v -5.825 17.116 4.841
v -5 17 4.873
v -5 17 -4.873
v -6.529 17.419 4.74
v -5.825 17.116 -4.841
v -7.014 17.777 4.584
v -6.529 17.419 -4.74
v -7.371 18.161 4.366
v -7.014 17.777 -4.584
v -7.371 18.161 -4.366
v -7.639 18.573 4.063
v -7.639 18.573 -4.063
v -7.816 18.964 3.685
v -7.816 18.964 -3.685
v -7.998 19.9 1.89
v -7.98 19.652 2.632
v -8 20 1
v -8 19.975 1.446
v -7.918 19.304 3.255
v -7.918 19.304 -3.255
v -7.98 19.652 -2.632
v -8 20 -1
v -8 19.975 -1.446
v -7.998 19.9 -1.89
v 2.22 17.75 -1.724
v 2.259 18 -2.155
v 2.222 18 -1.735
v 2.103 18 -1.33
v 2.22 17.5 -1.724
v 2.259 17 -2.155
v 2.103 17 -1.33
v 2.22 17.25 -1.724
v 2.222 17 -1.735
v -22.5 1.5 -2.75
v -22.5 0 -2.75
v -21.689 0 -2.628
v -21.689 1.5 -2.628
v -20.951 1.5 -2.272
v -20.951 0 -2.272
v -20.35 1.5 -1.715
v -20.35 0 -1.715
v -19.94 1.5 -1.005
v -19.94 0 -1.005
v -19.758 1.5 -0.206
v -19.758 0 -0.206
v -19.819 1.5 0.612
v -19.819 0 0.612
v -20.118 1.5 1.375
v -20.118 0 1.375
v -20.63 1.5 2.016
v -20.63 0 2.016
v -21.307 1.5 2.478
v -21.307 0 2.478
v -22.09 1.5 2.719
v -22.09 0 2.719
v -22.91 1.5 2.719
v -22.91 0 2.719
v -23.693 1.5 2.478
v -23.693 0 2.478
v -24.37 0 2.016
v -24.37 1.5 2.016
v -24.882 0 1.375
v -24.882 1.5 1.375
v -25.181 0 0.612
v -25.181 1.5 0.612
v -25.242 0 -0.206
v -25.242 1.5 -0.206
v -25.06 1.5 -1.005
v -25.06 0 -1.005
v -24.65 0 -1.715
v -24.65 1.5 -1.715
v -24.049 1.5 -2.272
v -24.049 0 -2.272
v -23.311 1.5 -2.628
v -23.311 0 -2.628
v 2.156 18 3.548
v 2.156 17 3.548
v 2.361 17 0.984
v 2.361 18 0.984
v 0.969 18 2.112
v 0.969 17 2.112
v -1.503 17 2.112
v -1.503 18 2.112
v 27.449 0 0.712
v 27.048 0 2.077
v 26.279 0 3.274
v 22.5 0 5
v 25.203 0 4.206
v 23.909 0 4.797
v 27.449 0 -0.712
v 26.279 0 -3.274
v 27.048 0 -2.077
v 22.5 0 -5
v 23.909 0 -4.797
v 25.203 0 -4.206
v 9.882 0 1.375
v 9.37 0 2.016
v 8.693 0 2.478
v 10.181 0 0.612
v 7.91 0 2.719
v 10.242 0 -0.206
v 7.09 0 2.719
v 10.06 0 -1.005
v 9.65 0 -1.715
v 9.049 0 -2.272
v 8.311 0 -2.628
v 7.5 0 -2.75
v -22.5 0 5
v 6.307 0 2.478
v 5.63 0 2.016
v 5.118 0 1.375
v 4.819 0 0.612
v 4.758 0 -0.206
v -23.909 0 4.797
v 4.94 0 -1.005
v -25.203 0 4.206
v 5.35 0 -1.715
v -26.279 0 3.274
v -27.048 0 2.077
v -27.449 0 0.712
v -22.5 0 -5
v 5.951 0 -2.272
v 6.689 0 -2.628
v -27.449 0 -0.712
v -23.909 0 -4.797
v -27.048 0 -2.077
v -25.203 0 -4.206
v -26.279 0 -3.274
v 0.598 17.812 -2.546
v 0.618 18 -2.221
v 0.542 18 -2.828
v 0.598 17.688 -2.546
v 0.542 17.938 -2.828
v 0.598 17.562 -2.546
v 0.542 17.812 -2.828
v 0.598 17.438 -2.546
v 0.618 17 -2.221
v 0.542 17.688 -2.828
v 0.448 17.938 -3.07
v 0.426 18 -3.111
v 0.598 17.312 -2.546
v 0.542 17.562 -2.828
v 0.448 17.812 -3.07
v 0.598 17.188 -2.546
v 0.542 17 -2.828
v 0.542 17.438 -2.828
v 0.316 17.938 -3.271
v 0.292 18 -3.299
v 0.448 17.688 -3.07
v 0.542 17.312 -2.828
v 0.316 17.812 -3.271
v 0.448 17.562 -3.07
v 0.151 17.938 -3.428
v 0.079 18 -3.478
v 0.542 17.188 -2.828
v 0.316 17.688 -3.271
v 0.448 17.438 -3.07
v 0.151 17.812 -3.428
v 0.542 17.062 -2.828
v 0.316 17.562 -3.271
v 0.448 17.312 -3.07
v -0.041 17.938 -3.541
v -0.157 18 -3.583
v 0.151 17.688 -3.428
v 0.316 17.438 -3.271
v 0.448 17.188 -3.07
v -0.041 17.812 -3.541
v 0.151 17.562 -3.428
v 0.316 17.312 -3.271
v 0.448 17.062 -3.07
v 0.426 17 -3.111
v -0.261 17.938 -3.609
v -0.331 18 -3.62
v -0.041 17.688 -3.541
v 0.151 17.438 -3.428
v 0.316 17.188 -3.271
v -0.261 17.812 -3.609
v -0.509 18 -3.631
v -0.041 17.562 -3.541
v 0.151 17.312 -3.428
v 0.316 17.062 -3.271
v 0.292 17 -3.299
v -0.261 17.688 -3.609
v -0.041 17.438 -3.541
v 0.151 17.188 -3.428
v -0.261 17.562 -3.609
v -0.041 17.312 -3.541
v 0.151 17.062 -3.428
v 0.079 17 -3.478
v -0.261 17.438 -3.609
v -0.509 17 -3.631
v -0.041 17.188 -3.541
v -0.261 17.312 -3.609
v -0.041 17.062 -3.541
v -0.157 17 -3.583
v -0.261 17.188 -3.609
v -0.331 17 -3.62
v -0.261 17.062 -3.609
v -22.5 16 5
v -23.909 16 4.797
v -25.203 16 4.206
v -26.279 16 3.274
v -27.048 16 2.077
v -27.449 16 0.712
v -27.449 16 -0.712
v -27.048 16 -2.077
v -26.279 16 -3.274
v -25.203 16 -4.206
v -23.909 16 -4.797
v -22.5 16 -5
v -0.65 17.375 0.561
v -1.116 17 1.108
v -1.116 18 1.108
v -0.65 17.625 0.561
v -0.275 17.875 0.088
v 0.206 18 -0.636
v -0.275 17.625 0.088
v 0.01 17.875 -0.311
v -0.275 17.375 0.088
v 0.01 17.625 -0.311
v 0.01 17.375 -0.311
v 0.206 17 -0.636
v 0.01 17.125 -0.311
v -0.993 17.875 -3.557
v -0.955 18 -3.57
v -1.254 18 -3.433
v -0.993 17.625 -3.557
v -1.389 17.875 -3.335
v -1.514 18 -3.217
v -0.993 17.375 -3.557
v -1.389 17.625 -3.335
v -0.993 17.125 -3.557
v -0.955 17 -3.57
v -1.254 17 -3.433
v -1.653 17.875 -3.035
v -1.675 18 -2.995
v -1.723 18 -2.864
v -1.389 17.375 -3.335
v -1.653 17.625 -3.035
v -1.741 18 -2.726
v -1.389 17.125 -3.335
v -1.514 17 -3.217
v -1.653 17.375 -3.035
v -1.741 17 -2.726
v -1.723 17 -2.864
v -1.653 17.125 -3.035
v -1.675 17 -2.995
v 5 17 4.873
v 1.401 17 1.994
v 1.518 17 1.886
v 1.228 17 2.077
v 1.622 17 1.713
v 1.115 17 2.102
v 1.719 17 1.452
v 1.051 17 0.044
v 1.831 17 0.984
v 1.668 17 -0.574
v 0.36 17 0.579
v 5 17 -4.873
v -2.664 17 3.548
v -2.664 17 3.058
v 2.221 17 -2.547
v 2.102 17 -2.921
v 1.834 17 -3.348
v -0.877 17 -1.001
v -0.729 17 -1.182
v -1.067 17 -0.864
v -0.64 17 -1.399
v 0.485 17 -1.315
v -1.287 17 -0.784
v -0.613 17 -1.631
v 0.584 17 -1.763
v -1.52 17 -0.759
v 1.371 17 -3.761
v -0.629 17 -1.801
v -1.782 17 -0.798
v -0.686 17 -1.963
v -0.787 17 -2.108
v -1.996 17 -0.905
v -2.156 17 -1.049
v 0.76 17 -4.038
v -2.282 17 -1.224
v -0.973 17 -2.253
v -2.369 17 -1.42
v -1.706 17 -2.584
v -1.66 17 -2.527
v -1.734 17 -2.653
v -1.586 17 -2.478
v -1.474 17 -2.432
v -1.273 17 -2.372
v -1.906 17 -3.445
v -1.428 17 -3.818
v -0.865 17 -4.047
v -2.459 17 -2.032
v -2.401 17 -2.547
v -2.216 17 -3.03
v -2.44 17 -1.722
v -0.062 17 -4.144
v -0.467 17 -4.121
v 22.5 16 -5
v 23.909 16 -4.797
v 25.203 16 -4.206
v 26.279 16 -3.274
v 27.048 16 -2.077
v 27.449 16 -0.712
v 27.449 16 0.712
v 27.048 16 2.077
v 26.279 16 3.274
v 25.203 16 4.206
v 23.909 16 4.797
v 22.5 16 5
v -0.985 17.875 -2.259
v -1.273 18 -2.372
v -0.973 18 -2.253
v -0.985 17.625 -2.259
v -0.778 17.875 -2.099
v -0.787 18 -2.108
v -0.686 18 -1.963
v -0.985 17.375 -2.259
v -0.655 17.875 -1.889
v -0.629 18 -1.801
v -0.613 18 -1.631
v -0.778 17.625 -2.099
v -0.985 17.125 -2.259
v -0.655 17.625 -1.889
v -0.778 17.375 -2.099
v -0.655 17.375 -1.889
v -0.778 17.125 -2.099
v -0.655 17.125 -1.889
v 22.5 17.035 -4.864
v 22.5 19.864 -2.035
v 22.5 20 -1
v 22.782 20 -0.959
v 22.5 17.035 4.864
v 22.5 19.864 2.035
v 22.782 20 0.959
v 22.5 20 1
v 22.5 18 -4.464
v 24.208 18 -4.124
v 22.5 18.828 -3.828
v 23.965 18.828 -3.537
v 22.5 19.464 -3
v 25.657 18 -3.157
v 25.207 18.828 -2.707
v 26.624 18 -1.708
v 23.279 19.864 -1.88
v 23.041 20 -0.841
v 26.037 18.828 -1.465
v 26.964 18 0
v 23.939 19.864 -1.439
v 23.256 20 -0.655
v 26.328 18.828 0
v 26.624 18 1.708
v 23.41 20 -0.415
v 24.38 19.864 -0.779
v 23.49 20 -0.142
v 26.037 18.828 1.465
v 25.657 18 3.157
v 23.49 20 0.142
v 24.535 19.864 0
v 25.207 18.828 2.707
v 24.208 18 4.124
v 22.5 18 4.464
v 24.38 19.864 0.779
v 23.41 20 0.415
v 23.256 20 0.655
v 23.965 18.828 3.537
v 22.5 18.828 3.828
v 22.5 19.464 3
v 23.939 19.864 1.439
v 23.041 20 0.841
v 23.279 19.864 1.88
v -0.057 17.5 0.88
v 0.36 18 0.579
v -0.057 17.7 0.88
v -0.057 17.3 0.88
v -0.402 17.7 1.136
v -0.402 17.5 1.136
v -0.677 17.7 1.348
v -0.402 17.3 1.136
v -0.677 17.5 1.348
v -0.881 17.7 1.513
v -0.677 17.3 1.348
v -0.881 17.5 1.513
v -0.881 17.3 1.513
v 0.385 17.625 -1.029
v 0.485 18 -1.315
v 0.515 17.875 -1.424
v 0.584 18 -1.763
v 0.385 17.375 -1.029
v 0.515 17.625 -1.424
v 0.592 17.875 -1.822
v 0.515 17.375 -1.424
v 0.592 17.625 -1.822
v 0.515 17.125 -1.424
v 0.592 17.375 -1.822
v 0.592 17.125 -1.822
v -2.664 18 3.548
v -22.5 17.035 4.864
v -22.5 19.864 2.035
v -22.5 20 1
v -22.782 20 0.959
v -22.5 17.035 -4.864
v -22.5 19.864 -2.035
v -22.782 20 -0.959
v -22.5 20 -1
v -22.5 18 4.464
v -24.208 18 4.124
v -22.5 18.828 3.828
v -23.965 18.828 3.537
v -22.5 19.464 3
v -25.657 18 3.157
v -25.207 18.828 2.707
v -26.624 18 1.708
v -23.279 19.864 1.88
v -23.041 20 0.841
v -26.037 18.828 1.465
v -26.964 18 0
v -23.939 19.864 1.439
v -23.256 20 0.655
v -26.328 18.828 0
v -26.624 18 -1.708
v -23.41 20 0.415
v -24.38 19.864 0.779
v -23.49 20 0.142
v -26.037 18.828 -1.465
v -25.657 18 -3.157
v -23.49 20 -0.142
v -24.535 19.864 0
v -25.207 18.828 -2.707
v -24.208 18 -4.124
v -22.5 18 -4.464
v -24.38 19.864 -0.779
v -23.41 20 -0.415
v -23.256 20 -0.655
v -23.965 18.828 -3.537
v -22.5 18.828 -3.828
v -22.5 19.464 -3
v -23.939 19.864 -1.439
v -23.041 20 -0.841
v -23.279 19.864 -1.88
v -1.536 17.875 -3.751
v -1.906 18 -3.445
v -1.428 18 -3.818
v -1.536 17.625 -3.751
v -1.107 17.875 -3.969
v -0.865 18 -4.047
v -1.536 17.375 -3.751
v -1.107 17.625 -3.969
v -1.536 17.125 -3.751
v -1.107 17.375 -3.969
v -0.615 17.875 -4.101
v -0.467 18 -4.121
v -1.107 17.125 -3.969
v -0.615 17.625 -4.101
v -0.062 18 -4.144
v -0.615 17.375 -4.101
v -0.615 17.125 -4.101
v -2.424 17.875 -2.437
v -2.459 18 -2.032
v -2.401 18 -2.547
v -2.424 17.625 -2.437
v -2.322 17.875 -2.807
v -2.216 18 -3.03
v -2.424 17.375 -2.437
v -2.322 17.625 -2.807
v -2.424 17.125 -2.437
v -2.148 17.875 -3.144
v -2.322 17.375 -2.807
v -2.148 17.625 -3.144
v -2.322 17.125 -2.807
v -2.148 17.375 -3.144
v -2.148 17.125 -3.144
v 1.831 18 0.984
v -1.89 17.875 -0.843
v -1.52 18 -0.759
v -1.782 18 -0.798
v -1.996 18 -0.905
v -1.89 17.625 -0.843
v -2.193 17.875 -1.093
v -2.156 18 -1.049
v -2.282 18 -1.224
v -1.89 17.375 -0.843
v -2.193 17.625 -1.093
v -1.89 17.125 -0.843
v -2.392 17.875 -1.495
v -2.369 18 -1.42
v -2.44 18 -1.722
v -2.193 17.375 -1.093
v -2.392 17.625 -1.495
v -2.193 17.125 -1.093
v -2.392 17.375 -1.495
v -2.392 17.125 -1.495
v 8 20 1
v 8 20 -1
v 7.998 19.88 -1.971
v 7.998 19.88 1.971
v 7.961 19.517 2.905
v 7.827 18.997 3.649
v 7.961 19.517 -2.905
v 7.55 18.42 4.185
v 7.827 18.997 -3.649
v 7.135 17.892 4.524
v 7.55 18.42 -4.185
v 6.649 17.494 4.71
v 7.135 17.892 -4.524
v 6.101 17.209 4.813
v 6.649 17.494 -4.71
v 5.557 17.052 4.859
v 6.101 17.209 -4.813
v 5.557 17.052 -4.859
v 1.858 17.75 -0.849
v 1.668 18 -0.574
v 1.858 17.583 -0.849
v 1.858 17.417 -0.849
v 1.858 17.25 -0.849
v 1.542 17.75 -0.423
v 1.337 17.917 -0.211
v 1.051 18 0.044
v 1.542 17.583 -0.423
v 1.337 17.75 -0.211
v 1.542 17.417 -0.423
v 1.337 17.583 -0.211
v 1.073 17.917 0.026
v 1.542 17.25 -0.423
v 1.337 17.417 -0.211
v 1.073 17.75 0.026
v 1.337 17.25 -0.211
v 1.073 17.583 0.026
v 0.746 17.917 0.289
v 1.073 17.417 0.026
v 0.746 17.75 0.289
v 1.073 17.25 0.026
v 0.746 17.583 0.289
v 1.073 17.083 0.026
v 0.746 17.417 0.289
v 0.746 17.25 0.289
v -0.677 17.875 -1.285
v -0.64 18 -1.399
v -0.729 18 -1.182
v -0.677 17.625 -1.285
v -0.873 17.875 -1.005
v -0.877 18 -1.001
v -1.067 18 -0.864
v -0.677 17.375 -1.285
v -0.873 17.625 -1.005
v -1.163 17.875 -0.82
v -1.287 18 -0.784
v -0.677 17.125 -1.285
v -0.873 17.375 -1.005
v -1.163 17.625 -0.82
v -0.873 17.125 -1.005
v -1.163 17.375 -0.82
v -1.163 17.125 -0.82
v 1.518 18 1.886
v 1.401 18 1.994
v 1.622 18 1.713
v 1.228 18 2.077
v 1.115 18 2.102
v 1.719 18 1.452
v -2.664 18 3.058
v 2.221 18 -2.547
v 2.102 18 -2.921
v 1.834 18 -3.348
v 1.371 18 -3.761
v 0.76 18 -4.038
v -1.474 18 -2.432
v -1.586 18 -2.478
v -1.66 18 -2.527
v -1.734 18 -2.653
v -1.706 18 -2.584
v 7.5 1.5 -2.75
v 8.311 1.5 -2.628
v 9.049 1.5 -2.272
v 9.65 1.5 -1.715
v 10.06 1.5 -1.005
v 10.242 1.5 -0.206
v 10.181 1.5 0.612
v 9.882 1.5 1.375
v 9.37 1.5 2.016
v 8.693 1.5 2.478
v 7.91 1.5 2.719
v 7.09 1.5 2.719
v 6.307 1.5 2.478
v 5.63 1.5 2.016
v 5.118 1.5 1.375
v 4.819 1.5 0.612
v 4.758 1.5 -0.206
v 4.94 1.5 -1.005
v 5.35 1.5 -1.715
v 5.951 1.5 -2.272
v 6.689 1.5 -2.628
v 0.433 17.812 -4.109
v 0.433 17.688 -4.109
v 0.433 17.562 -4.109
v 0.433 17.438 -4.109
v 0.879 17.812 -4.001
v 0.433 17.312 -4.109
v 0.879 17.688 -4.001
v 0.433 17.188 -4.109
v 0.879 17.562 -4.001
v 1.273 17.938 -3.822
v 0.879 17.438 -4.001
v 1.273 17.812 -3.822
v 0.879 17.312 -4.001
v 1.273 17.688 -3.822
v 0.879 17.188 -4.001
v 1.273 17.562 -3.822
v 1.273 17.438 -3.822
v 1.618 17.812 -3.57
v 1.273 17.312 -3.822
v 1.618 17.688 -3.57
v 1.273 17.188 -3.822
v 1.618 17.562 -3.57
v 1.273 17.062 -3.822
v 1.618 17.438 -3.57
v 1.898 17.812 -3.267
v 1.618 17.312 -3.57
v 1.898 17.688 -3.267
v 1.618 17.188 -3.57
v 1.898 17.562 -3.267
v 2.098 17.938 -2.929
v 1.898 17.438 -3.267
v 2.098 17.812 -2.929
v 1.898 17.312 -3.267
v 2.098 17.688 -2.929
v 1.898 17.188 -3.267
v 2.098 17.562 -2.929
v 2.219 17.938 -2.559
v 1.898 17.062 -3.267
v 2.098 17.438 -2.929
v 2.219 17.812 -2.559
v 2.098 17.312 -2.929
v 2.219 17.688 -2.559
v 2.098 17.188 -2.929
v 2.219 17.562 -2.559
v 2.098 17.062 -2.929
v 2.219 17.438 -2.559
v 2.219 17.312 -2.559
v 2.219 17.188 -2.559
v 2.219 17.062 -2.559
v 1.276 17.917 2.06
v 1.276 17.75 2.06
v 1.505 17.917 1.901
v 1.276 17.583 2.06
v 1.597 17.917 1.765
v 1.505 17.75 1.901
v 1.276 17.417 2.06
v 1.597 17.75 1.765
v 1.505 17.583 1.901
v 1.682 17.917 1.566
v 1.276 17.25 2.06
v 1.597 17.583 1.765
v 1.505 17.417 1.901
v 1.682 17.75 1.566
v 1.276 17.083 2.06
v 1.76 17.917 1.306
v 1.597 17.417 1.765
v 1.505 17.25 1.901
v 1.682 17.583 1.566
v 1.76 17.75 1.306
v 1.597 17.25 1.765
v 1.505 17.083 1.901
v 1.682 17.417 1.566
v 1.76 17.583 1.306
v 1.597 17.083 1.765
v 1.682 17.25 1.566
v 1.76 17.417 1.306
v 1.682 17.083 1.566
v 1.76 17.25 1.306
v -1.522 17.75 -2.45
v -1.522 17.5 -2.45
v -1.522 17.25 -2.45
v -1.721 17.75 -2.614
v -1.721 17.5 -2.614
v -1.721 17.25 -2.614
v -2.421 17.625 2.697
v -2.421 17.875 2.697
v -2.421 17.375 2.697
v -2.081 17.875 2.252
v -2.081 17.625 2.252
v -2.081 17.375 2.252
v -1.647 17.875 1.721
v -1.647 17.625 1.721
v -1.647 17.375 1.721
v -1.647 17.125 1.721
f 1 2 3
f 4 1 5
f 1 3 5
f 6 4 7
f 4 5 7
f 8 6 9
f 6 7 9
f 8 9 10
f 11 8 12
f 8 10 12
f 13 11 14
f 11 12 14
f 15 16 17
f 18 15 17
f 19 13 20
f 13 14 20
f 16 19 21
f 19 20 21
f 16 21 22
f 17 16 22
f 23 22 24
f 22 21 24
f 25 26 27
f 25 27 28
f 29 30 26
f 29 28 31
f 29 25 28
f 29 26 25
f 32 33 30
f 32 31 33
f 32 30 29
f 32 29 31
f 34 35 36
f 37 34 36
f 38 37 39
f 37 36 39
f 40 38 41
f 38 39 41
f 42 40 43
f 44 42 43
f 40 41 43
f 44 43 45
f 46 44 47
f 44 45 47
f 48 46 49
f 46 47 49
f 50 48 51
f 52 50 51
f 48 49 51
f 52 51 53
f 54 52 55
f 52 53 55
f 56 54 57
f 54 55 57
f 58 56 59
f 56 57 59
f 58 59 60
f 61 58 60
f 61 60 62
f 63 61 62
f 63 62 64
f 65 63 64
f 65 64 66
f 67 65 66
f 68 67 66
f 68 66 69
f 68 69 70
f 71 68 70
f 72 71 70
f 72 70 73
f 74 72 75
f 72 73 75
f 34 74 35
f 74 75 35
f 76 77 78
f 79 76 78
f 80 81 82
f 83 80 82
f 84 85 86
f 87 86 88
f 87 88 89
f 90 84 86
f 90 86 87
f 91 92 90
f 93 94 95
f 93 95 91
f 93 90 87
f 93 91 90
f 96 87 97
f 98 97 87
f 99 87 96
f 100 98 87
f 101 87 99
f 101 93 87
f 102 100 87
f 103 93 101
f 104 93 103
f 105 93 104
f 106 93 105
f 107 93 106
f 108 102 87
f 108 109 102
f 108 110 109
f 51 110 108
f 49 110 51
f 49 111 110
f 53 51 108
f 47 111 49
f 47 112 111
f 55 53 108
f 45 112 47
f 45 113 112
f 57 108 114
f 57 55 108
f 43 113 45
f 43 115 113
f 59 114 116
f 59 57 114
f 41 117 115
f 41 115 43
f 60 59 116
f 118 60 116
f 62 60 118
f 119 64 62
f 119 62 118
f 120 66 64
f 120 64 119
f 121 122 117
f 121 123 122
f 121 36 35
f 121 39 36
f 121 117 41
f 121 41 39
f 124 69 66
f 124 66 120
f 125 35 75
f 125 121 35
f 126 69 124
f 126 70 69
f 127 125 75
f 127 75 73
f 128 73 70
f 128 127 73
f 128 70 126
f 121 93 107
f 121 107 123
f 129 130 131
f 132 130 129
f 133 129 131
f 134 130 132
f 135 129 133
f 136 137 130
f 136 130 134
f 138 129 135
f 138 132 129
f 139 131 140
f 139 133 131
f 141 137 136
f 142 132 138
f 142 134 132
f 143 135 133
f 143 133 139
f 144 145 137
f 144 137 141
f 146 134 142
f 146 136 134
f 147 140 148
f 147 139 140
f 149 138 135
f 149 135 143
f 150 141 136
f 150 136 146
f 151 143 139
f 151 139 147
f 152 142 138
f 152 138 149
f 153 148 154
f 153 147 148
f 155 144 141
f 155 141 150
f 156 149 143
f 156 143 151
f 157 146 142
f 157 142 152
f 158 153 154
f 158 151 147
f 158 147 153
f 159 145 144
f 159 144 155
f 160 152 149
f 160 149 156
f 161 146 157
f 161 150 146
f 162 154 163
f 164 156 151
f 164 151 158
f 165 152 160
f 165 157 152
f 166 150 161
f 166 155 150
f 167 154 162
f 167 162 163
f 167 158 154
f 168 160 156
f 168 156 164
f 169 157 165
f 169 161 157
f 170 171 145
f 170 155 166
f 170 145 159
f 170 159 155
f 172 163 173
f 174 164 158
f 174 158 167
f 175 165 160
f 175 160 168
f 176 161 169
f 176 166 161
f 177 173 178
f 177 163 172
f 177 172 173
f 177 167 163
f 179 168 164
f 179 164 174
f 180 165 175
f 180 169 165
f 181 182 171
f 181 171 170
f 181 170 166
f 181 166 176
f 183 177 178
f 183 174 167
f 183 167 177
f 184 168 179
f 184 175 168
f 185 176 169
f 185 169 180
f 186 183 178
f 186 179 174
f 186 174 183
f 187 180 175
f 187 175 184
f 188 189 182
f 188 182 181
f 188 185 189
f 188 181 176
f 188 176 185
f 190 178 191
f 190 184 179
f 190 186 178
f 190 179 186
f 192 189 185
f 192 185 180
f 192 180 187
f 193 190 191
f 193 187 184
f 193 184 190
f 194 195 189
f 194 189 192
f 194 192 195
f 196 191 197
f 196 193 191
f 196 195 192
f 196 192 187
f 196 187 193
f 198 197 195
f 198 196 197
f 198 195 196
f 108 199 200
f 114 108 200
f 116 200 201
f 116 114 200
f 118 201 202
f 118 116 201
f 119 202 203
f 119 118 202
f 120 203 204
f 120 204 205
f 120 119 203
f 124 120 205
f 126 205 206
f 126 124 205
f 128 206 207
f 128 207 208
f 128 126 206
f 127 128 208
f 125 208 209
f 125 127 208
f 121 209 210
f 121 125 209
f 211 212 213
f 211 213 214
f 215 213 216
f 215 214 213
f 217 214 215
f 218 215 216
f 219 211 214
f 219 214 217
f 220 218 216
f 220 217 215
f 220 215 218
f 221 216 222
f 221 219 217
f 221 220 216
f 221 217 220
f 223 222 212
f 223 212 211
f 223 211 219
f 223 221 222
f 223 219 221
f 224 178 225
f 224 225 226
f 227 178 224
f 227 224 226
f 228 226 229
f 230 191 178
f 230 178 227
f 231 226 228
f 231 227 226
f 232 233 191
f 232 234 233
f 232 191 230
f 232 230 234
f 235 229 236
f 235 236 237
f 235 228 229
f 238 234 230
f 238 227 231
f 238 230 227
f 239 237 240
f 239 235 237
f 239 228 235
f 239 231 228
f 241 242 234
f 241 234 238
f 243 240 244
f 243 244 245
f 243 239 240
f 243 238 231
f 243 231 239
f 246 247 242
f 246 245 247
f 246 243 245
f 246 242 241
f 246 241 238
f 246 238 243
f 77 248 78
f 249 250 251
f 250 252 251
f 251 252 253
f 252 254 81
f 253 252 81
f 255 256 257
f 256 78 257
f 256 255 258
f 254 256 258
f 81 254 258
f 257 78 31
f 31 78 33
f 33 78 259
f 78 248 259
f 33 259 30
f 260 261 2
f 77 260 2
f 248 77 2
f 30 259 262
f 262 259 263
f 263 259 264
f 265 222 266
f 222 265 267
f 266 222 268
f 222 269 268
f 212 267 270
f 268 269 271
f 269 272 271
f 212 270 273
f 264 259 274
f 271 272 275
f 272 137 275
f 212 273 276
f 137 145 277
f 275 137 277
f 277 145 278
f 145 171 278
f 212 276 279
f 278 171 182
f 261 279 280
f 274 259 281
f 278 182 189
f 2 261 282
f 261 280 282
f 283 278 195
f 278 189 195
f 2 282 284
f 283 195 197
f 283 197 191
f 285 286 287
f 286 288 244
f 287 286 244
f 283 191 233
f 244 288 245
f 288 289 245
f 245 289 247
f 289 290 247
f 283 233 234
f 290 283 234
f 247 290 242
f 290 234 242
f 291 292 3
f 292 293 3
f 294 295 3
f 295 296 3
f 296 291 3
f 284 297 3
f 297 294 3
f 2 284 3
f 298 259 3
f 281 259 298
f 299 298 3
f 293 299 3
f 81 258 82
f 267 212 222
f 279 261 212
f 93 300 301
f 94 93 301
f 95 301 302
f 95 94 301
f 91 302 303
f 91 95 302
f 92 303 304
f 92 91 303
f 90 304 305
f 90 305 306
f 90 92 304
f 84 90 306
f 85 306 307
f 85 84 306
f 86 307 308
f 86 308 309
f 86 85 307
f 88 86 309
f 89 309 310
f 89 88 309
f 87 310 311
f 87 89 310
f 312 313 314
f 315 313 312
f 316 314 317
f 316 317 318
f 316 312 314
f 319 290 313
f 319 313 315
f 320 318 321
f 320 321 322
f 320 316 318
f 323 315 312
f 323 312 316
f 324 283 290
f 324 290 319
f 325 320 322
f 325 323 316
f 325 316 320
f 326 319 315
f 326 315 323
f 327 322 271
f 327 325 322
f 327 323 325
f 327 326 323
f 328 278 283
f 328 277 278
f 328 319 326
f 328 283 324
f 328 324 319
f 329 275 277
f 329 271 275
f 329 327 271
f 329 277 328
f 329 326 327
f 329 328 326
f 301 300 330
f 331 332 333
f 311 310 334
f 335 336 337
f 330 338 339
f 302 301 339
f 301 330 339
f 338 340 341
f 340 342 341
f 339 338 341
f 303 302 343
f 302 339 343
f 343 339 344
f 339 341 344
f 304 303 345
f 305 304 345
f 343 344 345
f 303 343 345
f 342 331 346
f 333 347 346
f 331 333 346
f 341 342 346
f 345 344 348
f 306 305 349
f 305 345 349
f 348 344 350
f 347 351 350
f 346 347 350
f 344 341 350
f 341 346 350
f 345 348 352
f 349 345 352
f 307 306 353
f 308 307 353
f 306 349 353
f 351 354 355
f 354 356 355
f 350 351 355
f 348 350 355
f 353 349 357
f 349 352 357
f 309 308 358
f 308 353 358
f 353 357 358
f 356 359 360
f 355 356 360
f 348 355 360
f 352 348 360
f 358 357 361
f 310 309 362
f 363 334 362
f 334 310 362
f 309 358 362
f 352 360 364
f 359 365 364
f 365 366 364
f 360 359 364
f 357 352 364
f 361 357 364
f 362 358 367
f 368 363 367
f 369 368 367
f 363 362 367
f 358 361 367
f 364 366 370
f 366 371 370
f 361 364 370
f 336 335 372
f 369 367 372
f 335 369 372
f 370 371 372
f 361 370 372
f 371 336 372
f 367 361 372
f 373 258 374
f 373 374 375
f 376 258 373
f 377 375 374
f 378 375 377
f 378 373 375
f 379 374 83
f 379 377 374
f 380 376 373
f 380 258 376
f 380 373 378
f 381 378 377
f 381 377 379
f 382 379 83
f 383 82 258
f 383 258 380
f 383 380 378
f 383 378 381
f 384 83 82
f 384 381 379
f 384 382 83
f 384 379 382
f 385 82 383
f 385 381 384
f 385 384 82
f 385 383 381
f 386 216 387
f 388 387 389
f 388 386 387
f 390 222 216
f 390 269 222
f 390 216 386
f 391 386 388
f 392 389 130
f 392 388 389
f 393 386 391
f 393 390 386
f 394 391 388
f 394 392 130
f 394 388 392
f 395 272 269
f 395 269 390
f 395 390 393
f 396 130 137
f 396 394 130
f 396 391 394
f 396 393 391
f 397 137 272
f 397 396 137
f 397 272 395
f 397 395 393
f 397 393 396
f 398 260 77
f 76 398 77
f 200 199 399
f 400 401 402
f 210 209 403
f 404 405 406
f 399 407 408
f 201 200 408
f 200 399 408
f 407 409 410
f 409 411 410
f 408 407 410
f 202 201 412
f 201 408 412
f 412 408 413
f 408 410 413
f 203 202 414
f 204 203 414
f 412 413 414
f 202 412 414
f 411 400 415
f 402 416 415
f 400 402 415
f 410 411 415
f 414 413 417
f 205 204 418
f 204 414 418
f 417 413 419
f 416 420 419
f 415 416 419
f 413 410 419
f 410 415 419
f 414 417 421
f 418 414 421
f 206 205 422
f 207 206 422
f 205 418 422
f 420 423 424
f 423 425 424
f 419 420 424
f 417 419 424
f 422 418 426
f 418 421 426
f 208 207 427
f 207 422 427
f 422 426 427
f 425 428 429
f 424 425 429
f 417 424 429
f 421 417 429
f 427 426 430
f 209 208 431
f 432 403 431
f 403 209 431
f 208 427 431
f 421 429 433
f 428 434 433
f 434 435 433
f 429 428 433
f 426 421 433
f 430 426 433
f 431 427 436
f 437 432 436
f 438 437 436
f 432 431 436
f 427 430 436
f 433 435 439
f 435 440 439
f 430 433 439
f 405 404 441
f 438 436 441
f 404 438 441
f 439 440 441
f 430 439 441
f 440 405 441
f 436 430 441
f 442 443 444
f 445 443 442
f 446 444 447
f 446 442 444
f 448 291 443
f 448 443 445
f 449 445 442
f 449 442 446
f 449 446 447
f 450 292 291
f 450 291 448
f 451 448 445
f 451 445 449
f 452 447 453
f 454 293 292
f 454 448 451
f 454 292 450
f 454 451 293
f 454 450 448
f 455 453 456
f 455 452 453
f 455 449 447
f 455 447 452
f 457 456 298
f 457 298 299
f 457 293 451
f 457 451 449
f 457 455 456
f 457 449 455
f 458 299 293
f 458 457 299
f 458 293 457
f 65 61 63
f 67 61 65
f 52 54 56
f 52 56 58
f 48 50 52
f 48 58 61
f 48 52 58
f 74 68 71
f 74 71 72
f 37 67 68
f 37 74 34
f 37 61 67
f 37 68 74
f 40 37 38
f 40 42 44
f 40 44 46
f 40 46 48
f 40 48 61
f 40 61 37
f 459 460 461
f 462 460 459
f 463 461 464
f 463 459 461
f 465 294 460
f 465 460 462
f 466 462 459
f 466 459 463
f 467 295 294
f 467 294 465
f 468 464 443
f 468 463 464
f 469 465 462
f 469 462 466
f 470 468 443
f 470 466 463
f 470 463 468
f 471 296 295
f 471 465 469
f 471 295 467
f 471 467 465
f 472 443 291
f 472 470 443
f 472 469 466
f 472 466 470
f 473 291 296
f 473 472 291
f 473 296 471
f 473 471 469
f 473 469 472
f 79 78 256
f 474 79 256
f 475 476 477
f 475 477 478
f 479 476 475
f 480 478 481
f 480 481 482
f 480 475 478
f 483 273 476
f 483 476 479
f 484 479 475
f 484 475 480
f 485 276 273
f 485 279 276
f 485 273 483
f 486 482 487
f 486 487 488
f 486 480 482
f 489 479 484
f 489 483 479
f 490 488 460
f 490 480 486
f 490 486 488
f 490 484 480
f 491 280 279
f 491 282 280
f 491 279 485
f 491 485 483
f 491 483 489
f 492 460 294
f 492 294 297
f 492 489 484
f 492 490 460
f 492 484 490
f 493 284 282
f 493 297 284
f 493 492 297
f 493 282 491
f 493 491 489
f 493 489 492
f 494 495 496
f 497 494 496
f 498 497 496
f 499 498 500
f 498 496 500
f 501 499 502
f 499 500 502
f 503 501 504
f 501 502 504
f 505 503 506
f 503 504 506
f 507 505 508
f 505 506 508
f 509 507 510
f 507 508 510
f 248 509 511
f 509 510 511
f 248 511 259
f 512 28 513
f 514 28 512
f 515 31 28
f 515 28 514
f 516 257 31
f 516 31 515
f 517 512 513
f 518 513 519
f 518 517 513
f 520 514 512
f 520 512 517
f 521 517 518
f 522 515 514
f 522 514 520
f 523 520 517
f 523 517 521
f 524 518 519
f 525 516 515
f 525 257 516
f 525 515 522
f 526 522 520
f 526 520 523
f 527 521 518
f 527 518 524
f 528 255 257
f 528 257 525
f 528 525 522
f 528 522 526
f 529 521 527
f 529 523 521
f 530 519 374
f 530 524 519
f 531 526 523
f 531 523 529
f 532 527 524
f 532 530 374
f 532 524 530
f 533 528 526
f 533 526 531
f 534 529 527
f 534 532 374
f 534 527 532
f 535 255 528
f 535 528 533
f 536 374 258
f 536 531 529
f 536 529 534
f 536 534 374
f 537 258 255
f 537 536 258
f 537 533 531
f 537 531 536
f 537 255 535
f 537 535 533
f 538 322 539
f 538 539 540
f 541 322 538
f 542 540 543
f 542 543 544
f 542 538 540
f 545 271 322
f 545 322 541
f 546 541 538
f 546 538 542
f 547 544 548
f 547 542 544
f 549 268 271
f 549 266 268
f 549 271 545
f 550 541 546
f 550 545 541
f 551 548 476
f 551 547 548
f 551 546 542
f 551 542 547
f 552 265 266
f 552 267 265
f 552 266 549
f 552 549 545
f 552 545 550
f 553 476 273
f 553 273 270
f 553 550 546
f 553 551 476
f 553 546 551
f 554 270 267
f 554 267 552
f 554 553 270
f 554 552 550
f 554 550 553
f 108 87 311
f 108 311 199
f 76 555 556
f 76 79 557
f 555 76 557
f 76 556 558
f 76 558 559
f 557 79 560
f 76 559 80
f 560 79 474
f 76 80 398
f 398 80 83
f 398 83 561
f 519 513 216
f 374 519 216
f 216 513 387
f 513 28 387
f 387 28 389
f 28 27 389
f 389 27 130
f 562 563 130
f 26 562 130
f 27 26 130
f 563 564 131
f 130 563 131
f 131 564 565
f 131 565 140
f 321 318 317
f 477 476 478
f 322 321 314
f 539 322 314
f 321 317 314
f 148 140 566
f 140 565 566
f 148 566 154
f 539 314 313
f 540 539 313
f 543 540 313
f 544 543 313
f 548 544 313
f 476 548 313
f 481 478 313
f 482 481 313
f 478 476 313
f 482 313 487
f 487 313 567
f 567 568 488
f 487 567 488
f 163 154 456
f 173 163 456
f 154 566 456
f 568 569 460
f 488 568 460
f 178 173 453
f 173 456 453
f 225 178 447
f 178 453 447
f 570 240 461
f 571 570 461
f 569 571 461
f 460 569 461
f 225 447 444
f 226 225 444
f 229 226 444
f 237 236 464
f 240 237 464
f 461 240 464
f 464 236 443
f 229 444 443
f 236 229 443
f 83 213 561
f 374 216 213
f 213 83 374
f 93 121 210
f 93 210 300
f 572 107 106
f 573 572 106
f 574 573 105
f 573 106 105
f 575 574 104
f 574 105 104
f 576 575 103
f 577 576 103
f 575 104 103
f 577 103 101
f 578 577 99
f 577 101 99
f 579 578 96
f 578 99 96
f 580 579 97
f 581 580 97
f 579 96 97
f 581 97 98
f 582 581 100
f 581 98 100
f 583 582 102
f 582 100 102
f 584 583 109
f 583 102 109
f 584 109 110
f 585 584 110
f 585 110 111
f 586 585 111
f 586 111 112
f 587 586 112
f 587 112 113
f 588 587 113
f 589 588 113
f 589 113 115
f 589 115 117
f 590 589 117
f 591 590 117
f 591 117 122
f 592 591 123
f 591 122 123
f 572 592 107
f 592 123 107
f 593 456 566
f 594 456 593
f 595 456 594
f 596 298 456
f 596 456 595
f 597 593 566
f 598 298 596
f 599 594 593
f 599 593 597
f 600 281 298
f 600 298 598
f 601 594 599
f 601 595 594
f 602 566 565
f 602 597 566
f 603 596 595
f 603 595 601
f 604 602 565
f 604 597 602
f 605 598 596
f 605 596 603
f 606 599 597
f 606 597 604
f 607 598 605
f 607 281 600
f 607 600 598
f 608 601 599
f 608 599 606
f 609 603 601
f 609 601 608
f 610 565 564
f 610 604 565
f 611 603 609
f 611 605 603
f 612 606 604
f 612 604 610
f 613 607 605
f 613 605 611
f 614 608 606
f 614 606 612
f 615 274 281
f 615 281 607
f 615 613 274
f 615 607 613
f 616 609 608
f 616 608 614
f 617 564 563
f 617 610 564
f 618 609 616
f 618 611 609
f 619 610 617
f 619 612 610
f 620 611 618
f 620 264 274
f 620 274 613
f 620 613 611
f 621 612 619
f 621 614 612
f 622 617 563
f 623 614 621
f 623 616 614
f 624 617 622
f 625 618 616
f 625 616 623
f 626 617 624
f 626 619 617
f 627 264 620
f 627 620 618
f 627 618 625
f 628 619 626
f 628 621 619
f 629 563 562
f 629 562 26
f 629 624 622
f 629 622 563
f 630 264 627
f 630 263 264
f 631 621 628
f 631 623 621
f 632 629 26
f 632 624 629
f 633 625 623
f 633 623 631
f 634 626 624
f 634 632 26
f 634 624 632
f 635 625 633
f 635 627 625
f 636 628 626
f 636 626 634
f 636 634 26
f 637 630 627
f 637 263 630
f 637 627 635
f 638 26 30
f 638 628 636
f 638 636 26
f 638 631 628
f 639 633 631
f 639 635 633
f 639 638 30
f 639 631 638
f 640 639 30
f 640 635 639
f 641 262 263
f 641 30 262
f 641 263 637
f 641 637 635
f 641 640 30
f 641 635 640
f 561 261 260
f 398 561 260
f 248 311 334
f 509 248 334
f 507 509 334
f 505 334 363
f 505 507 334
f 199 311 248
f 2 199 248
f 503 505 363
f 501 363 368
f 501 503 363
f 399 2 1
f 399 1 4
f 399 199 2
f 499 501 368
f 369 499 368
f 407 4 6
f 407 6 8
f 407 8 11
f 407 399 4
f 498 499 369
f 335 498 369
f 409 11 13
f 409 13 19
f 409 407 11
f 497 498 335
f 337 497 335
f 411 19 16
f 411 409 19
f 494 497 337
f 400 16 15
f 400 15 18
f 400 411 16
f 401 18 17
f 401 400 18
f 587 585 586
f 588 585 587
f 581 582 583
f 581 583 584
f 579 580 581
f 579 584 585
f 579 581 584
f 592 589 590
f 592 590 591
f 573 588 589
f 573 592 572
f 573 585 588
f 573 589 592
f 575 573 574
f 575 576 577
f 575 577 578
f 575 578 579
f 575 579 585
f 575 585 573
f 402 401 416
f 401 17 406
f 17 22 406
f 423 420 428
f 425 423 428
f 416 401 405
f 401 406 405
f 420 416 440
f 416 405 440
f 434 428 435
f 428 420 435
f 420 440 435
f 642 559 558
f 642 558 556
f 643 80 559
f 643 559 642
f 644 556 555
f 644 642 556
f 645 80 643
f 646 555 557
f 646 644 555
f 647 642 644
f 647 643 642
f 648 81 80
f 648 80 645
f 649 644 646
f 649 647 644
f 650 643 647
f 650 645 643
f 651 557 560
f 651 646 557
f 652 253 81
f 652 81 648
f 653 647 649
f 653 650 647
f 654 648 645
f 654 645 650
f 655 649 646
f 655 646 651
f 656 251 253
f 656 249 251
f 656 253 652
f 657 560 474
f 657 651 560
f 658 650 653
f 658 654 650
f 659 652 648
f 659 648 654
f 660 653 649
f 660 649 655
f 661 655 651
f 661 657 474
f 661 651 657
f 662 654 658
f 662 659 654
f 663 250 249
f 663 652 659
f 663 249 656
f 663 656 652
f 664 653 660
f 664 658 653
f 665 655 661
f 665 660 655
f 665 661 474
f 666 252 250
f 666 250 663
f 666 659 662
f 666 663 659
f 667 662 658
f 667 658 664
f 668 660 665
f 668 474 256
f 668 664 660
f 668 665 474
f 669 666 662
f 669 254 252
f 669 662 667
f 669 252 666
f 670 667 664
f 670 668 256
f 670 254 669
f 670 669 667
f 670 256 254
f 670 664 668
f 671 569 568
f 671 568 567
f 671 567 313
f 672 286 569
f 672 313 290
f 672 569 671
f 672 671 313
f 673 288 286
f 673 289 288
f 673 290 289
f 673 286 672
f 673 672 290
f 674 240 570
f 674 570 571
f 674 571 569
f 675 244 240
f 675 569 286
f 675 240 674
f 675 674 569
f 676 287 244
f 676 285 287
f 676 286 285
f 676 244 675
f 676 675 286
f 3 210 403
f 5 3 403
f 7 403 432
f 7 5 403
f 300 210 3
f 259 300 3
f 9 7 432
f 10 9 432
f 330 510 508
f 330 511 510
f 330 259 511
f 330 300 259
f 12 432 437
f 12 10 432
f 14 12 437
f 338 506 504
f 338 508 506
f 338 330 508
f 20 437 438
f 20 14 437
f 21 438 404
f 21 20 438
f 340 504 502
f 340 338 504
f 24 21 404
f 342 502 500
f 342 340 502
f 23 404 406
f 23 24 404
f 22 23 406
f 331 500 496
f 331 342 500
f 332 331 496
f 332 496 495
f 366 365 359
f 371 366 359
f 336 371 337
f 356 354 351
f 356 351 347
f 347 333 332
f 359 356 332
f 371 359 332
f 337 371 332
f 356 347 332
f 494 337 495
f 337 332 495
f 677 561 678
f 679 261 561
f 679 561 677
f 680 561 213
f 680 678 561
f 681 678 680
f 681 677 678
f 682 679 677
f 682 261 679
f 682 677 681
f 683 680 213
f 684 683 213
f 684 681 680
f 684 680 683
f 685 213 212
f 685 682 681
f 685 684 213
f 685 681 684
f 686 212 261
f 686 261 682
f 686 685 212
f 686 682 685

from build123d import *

# Parameters (mm, degrees)
BOSS_EXTRUDE1_DEPTH     = 20
FILLET1_R               = 4
SKETCH2_R               = 2.75
CUT_EXTRUDE1_DEPTH      = 1.5
LPATTERN1_COUNT         = 2
LPATTERN1_PITCH         = 30
CUT_EXTRUDE2_DEPTH      = 35.369317712
CUT_EXTRUDE2_DEPTH_BACK = 35.369317712
WRAP1_DEPTH             = 1


# Read off the part's stored shape, not the designer's step: Wrap1
with BuildPart() as part:
    # Sketch1 → Boss-Extrude1 (new body)
    with BuildSketch(Plane(origin=(0, 0, 0), x_dir=(1, 0, 0), z_dir=(0, 1, 0))):
        with BuildLine():
            Line((22.5, -5), (-22.5, -5))
            ThreePointArc((-22.5, -5), (-27.5, 0), (-22.5, 5))
            Line((-22.5, 5), (22.5, 5))
            ThreePointArc((22.5, 5), (27.5, 0), (22.5, -5))
        make_face()
    extrude(amount=BOSS_EXTRUDE1_DEPTH)

    # Fillet1
    fillet1_edges = [part.edges().sort_by_distance(p)[0] for p in [
        (-27.5, 20, 0),
        (0, 20, 5),
        (27.5, 20, 0),
        (0, 20, -5),
    ]]
    fillet(fillet1_edges, radius=FILLET1_R)

    # Sketch2 → Cut-Extrude1 (cut)
    with BuildSketch(Plane.XZ):
        with Locations(Location((-22.5, 0, 0), (0, 0, 270))):
            Circle(SKETCH2_R)
    cut_extrude1 = extrude(amount=-CUT_EXTRUDE1_DEPTH, mode=Mode.SUBTRACT)

    # LPattern1: Cut-Extrude1 ×2
    with Locations(*[(i * LPATTERN1_PITCH, 0, 0) for i in range(1, LPATTERN1_COUNT)]):
        add(cut_extrude1, mode=Mode.SUBTRACT)

    # Sketch3 → Cut-Extrude2 (cut, two sides: drawn at the far end of the back side and taken through both)
    with BuildSketch(Plane.XY.offset(-CUT_EXTRUDE2_DEPTH_BACK)):
        with BuildLine():
            Line((-5, 23), (5, 23))
            ThreePointArc((5, 23), (8, 20), (5, 17))
            Line((5, 17), (-5, 17))
            ThreePointArc((-5, 17), (-8, 20), (-5, 23))
        make_face()
    extrude(amount=CUT_EXTRUDE2_DEPTH + CUT_EXTRUDE2_DEPTH_BACK, mode=Mode.SUBTRACT)

    # Wrap1 outline → Wrap1 (add)
    with BuildSketch(Plane(origin=(0, 17, 0), x_dir=(1, 0, 0), z_dir=(0, 1, 0))):
        with BuildLine():
            add(Edge.make_bspline(
                [(0.968558604, -2.112404227), (1.023340463, -2.110381468), (1.128135866, -2.106512015), (1.275421614, -2.065066433), (1.40411806, -1.999153831), (1.494113345, -1.918796765), (1.555259283, -1.8377784), (1.600182088, -1.761379971), (1.643056037, -1.669468115), (1.68410688, -1.562162987), (1.724115658, -1.439672484), (1.762787282, -1.301883834), (1.796828359, -1.147944523), (1.819117415, -1.040313742), (1.830738091, -0.984199098)],
                knots=[0, 0, 0, 0, 0.10403341, 0.199011557, 0.288612319, 0.377191825, 0.425797175, 0.481425289, 0.545557079, 0.61863331, 0.699984683, 0.790771883, 0.890916323, 1, 1, 1, 1], degree=3))
            Line((0.968558604, -2.112404227), (-1.502595242, -2.112404227))
            add(Edge.make_bspline(
                [(0.359584245, -0.57875038), (0.287589412, -0.631266446), (0.149119993, -0.732271876), (-0.052040125, -0.874957595), (-0.232151558, -1.010570949), (-0.396984875, -1.13231455), (-0.543079134, -1.243803459), (-0.672030163, -1.343433338), (-0.782764208, -1.43141572), (-0.961872458, -1.579798827), (-1.207220157, -1.798528227), (-1.40469562, -2.00837263), (-1.502595242, -2.112404227)],
                knots=[0, 0, 0, 0, 0.110593572, 0.212707314, 0.306051588, 0.390379305, 0.467018215, 0.534117187, 0.592614819, 0.642525788, 0.822780058, 1, 1, 1, 1], degree=3))
            add(Edge.make_bspline(
                [(2.103173989, 1.329903466), (2.066781163, 1.246346618), (1.99482956, 1.081147874), (1.86047631, 0.847661593), (1.71297016, 0.626020413), (1.571074283, 0.452909604), (1.445054335, 0.315568643), (1.334068385, 0.207346612), (1.208958187, 0.091994137), (1.069166496, -0.030104), (0.913592831, -0.158279882), (0.741560734, -0.29208501), (0.556771712, -0.435146764), (0.42660857, -0.529939289), (0.359584245, -0.57875038)],
                knots=[0, 0, 0, 0, 0.10413489, 0.205883221, 0.307528832, 0.408265615, 0.461433854, 0.520606469, 0.585444086, 0.656004792, 0.732803839, 0.815893726, 0.905198979, 1, 1, 1, 1], degree=3))
            add(Edge.make_bspline(
                [(2.258622707, 2.155223979), (2.256854974, 2.081406691), (2.253395008, 1.936924834), (2.223825952, 1.724789841), (2.174767432, 1.522306219), (2.126875674, 1.393600214), (2.103173989, 1.329903466)],
                knots=[0, 0, 0, 0, 0.261979501, 0.512769921, 0.758869279, 1, 1, 1, 1], degree=3))
            add(Edge.make_bspline(
                [(-0.061890114, 4.14400603), (0.022564629, 4.141920306), (0.18812583, 4.13783155), (0.430620451, 4.112847977), (0.660471364, 4.067558501), (0.878305178, 4.005888588), (1.082018473, 3.923000729), (1.274759097, 3.825795699), (1.453280397, 3.707304776), (1.618929442, 3.573545968), (1.768923738, 3.427244365), (1.900049838, 3.270535022), (2.011299511, 3.105351175), (2.101257211, 2.93081783), (2.172841542, 2.749020464), (2.221753805, 2.558426678), (2.253872753, 2.359840276), (2.257020026, 2.224263519), (2.258622707, 2.155223979)],
                knots=[0, 0, 0, 0, 0.074102612, 0.14526736, 0.21355926, 0.279416432, 0.343556942, 0.406228654, 0.468492489, 0.531146675, 0.592790073, 0.652016559, 0.710119813, 0.767135501, 0.823967905, 0.881147087, 0.939476717, 1, 1, 1, 1], degree=3))
            add(Edge.make_bspline(
                [(-1.906441396, 3.445288081), (-1.848306189, 3.501112989), (-1.732554849, 3.612264359), (-1.538609793, 3.754854821), (-1.330466242, 3.876473687), (-1.105791254, 3.973994027), (-0.866480346, 4.051164268), (-0.611446439, 4.105367467), (-0.341562002, 4.137488539), (-0.156530269, 4.14180053), (-0.061890114, 4.14400603)],
                knots=[0, 0, 0, 0, 0.119107626, 0.23715177, 0.355050392, 0.47498588, 0.598670295, 0.726365388, 0.860041186, 1, 1, 1, 1], degree=3))
            add(Edge.make_bspline(
                [(-2.459326011, 2.031826543), (-2.458122329, 2.10083777), (-2.455751672, 2.236755643), (-2.42704922, 2.435648535), (-2.383831572, 2.625974396), (-2.325084873, 2.808678323), (-2.245799792, 2.981581962), (-2.150493697, 3.146407777), (-2.038697096, 3.303051555), (-1.950794522, 3.397587797), (-1.906441396, 3.445288081)],
                knots=[0, 0, 0, 0, 0.132803649, 0.26155729, 0.386082589, 0.508400008, 0.630401232, 0.751619273, 0.874674186, 1, 1, 1, 1], degree=3))
            add(Edge.make_bspline(
                [(-1.520223447, 0.759390645), (-1.585420599, 0.763118791), (-1.713143024, 0.770422298), (-1.895082142, 0.836934937), (-2.058691576, 0.943915448), (-2.201841078, 1.092044894), (-2.320121913, 1.277705611), (-2.399559254, 1.501224402), (-2.452612405, 1.75530448), (-2.457009968, 1.936432658), (-2.459326011, 2.031826543)],
                knots=[0, 0, 0, 0, 0.110139331, 0.215764983, 0.323707128, 0.438906263, 0.562183724, 0.693638164, 0.838649921, 1, 1, 1, 1], degree=3))
            add(Edge.make_bspline(
                [(-0.613172165, 1.631185517), (-0.616054345, 1.570486701), (-0.621662157, 1.45238594), (-0.671323685, 1.283175242), (-0.754629801, 1.131365188), (-0.869218028, 1.000302814), (-1.00648217, 0.893380798), (-1.162575656, 0.81342959), (-1.336719307, 0.768952542), (-1.458017598, 0.762632021), (-1.520223447, 0.759390645)],
                knots=[0, 0, 0, 0, 0.129242333, 0.251464839, 0.372304265, 0.495878621, 0.620081591, 0.741344555, 0.867352775, 1, 1, 1, 1], degree=3))
            add(Edge.make_bspline(
                [(-1.273428575, 2.371570132), (-1.221111857, 2.356431424), (-1.121681232, 2.327659528), (-0.986315759, 2.264054818), (-0.872118751, 2.188748181), (-0.775565412, 2.103031066), (-0.702763657, 2.001965174), (-0.650977929, 1.888692008), (-0.61737495, 1.763975364), (-0.614599413, 1.676280399), (-0.613172165, 1.631185517)],
                knots=[0, 0, 0, 0, 0.151156851, 0.287281401, 0.413669873, 0.530293514, 0.644009236, 0.756908248, 0.874996313, 1, 1, 1, 1], degree=3))
            add(Edge.make_bspline(
                [(-1.659646524, 2.52701885), (-1.641908981, 2.5134804), (-1.599762076, 2.48131113), (-1.513799429, 2.446453071), (-1.403911325, 2.405291879), (-1.319666952, 2.383519902), (-1.273428575, 2.371570132)],
                knots=[0, 0, 0, 0, 0.159109439, 0.378066483, 0.65864549, 1, 1, 1, 1], degree=3))
            add(Edge.make_bspline(
                [(-1.741377293, 2.725736799), (-1.740702967, 2.705828636), (-1.739402264, 2.667427893), (-1.722346439, 2.613602242), (-1.696843256, 2.565494988), (-1.672067897, 2.539867464), (-1.659646524, 2.52701885)],
                knots=[0, 0, 0, 0, 0.268945253, 0.518766978, 0.758729042, 1, 1, 1, 1], degree=3))
            add(Edge.make_bspline(
                [(-0.509005498, 3.631185517), (-0.593702292, 3.627478268), (-0.757485819, 3.620309328), (-0.992510379, 3.565399378), (-1.204920463, 3.4708981), (-1.388970755, 3.342097951), (-1.54050767, 3.195942921), (-1.655393233, 3.044422755), (-1.727025811, 2.886507887), (-1.736695124, 2.778188345), (-1.741377293, 2.725736799)],
                knots=[0, 0, 0, 0, 0.151816317, 0.293576777, 0.429964406, 0.566304914, 0.694365033, 0.806085808, 0.906100976, 1, 1, 1, 1], degree=3))
            add(Edge.make_bspline(
                [(0.617597066, 2.220929107), (0.616798314, 2.277062503), (0.615251229, 2.385786079), (0.599863671, 2.542997259), (0.579004071, 2.690242583), (0.544058374, 2.826348498), (0.504153512, 2.954009696), (0.449772713, 3.069509609), (0.389899195, 3.176431124), (0.318093883, 3.271087373), (0.240513737, 3.356936451), (0.152380296, 3.428872442), (0.059506725, 3.491963217), (-0.040243661, 3.543993611), (-0.147906764, 3.581901434), (-0.261368703, 3.611540097), (-0.38306343, 3.626855058), (-0.466235221, 3.629714881), (-0.509005498, 3.631185517)],
                knots=[0, 0, 0, 0, 0.082284271, 0.159374645, 0.231497254, 0.300083139, 0.36523236, 0.427274673, 0.486932074, 0.544586116, 0.60112786, 0.656190593, 0.710940404, 0.765594865, 0.820607428, 0.877984079, 0.93725451, 1, 1, 1, 1], degree=3))
            add(Edge.make_bspline(
                [(0.205738091, 0.635993209), (0.238640814, 0.700768661), (0.303861654, 0.829168655), (0.385865127, 1.026897746), (0.459663901, 1.22391557), (0.516579645, 1.422967903), (0.561905142, 1.621957205), (0.593823909, 1.82108009), (0.613938148, 2.020726724), (0.616375849, 2.154108657), (0.617597066, 2.220929107)],
                knots=[0, 0, 0, 0, 0.131745637, 0.261150462, 0.388067803, 0.513189353, 0.636374668, 0.758087597, 0.878808958, 1, 1, 1, 1], degree=3))
            add(Edge.make_bspline(
                [(-1.116377293, -1.107596534), (-1.03496234, -1.013767374), (-0.878016077, -0.832889839), (-0.655626445, -0.569536189), (-0.456135085, -0.32390871), (-0.280159151, -0.096566641), (-0.125247461, 0.111659158), (0.00577288, 0.302221735), (0.116680709, 0.473318508), (0.177475044, 0.584367138), (0.205738091, 0.635993209)],
                knots=[0, 0, 0, 0, 0.170005554, 0.327725258, 0.471696803, 0.603008639, 0.721148947, 0.826797124, 0.919478664, 1, 1, 1, 1], degree=3))
            add(Edge.make_bspline(
                [(-2.664454216, -3.057917047), (-2.628698989, -3.000910883), (-2.55158858, -2.877970296), (-2.41479269, -2.688825323), (-2.259314405, -2.474715573), (-2.074551732, -2.243606397), (-1.870318919, -1.988170585), (-1.640593125, -1.712928149), (-1.387471618, -1.416348269), (-1.20904993, -1.213142224), (-1.116377293, -1.107596534)],
                knots=[0, 0, 0, 0, 0.080973991, 0.174630064, 0.280853316, 0.39944862, 0.530692677, 0.674513651, 0.830941638, 1, 1, 1, 1], degree=3))
            Line((-2.664454216, -3.057917047), (-2.664454216, -3.548301662))
            Line((-2.664454216, -3.548301662), (2.156058604, -3.548301662))
            Line((2.156058604, -3.548301662), (2.361186809, -0.984199098))
            Line((2.361186809, -0.984199098), (1.830738091, -0.984199098))
        make_face()
    extrude(amount=WRAP1_DEPTH)


solid = part.part
